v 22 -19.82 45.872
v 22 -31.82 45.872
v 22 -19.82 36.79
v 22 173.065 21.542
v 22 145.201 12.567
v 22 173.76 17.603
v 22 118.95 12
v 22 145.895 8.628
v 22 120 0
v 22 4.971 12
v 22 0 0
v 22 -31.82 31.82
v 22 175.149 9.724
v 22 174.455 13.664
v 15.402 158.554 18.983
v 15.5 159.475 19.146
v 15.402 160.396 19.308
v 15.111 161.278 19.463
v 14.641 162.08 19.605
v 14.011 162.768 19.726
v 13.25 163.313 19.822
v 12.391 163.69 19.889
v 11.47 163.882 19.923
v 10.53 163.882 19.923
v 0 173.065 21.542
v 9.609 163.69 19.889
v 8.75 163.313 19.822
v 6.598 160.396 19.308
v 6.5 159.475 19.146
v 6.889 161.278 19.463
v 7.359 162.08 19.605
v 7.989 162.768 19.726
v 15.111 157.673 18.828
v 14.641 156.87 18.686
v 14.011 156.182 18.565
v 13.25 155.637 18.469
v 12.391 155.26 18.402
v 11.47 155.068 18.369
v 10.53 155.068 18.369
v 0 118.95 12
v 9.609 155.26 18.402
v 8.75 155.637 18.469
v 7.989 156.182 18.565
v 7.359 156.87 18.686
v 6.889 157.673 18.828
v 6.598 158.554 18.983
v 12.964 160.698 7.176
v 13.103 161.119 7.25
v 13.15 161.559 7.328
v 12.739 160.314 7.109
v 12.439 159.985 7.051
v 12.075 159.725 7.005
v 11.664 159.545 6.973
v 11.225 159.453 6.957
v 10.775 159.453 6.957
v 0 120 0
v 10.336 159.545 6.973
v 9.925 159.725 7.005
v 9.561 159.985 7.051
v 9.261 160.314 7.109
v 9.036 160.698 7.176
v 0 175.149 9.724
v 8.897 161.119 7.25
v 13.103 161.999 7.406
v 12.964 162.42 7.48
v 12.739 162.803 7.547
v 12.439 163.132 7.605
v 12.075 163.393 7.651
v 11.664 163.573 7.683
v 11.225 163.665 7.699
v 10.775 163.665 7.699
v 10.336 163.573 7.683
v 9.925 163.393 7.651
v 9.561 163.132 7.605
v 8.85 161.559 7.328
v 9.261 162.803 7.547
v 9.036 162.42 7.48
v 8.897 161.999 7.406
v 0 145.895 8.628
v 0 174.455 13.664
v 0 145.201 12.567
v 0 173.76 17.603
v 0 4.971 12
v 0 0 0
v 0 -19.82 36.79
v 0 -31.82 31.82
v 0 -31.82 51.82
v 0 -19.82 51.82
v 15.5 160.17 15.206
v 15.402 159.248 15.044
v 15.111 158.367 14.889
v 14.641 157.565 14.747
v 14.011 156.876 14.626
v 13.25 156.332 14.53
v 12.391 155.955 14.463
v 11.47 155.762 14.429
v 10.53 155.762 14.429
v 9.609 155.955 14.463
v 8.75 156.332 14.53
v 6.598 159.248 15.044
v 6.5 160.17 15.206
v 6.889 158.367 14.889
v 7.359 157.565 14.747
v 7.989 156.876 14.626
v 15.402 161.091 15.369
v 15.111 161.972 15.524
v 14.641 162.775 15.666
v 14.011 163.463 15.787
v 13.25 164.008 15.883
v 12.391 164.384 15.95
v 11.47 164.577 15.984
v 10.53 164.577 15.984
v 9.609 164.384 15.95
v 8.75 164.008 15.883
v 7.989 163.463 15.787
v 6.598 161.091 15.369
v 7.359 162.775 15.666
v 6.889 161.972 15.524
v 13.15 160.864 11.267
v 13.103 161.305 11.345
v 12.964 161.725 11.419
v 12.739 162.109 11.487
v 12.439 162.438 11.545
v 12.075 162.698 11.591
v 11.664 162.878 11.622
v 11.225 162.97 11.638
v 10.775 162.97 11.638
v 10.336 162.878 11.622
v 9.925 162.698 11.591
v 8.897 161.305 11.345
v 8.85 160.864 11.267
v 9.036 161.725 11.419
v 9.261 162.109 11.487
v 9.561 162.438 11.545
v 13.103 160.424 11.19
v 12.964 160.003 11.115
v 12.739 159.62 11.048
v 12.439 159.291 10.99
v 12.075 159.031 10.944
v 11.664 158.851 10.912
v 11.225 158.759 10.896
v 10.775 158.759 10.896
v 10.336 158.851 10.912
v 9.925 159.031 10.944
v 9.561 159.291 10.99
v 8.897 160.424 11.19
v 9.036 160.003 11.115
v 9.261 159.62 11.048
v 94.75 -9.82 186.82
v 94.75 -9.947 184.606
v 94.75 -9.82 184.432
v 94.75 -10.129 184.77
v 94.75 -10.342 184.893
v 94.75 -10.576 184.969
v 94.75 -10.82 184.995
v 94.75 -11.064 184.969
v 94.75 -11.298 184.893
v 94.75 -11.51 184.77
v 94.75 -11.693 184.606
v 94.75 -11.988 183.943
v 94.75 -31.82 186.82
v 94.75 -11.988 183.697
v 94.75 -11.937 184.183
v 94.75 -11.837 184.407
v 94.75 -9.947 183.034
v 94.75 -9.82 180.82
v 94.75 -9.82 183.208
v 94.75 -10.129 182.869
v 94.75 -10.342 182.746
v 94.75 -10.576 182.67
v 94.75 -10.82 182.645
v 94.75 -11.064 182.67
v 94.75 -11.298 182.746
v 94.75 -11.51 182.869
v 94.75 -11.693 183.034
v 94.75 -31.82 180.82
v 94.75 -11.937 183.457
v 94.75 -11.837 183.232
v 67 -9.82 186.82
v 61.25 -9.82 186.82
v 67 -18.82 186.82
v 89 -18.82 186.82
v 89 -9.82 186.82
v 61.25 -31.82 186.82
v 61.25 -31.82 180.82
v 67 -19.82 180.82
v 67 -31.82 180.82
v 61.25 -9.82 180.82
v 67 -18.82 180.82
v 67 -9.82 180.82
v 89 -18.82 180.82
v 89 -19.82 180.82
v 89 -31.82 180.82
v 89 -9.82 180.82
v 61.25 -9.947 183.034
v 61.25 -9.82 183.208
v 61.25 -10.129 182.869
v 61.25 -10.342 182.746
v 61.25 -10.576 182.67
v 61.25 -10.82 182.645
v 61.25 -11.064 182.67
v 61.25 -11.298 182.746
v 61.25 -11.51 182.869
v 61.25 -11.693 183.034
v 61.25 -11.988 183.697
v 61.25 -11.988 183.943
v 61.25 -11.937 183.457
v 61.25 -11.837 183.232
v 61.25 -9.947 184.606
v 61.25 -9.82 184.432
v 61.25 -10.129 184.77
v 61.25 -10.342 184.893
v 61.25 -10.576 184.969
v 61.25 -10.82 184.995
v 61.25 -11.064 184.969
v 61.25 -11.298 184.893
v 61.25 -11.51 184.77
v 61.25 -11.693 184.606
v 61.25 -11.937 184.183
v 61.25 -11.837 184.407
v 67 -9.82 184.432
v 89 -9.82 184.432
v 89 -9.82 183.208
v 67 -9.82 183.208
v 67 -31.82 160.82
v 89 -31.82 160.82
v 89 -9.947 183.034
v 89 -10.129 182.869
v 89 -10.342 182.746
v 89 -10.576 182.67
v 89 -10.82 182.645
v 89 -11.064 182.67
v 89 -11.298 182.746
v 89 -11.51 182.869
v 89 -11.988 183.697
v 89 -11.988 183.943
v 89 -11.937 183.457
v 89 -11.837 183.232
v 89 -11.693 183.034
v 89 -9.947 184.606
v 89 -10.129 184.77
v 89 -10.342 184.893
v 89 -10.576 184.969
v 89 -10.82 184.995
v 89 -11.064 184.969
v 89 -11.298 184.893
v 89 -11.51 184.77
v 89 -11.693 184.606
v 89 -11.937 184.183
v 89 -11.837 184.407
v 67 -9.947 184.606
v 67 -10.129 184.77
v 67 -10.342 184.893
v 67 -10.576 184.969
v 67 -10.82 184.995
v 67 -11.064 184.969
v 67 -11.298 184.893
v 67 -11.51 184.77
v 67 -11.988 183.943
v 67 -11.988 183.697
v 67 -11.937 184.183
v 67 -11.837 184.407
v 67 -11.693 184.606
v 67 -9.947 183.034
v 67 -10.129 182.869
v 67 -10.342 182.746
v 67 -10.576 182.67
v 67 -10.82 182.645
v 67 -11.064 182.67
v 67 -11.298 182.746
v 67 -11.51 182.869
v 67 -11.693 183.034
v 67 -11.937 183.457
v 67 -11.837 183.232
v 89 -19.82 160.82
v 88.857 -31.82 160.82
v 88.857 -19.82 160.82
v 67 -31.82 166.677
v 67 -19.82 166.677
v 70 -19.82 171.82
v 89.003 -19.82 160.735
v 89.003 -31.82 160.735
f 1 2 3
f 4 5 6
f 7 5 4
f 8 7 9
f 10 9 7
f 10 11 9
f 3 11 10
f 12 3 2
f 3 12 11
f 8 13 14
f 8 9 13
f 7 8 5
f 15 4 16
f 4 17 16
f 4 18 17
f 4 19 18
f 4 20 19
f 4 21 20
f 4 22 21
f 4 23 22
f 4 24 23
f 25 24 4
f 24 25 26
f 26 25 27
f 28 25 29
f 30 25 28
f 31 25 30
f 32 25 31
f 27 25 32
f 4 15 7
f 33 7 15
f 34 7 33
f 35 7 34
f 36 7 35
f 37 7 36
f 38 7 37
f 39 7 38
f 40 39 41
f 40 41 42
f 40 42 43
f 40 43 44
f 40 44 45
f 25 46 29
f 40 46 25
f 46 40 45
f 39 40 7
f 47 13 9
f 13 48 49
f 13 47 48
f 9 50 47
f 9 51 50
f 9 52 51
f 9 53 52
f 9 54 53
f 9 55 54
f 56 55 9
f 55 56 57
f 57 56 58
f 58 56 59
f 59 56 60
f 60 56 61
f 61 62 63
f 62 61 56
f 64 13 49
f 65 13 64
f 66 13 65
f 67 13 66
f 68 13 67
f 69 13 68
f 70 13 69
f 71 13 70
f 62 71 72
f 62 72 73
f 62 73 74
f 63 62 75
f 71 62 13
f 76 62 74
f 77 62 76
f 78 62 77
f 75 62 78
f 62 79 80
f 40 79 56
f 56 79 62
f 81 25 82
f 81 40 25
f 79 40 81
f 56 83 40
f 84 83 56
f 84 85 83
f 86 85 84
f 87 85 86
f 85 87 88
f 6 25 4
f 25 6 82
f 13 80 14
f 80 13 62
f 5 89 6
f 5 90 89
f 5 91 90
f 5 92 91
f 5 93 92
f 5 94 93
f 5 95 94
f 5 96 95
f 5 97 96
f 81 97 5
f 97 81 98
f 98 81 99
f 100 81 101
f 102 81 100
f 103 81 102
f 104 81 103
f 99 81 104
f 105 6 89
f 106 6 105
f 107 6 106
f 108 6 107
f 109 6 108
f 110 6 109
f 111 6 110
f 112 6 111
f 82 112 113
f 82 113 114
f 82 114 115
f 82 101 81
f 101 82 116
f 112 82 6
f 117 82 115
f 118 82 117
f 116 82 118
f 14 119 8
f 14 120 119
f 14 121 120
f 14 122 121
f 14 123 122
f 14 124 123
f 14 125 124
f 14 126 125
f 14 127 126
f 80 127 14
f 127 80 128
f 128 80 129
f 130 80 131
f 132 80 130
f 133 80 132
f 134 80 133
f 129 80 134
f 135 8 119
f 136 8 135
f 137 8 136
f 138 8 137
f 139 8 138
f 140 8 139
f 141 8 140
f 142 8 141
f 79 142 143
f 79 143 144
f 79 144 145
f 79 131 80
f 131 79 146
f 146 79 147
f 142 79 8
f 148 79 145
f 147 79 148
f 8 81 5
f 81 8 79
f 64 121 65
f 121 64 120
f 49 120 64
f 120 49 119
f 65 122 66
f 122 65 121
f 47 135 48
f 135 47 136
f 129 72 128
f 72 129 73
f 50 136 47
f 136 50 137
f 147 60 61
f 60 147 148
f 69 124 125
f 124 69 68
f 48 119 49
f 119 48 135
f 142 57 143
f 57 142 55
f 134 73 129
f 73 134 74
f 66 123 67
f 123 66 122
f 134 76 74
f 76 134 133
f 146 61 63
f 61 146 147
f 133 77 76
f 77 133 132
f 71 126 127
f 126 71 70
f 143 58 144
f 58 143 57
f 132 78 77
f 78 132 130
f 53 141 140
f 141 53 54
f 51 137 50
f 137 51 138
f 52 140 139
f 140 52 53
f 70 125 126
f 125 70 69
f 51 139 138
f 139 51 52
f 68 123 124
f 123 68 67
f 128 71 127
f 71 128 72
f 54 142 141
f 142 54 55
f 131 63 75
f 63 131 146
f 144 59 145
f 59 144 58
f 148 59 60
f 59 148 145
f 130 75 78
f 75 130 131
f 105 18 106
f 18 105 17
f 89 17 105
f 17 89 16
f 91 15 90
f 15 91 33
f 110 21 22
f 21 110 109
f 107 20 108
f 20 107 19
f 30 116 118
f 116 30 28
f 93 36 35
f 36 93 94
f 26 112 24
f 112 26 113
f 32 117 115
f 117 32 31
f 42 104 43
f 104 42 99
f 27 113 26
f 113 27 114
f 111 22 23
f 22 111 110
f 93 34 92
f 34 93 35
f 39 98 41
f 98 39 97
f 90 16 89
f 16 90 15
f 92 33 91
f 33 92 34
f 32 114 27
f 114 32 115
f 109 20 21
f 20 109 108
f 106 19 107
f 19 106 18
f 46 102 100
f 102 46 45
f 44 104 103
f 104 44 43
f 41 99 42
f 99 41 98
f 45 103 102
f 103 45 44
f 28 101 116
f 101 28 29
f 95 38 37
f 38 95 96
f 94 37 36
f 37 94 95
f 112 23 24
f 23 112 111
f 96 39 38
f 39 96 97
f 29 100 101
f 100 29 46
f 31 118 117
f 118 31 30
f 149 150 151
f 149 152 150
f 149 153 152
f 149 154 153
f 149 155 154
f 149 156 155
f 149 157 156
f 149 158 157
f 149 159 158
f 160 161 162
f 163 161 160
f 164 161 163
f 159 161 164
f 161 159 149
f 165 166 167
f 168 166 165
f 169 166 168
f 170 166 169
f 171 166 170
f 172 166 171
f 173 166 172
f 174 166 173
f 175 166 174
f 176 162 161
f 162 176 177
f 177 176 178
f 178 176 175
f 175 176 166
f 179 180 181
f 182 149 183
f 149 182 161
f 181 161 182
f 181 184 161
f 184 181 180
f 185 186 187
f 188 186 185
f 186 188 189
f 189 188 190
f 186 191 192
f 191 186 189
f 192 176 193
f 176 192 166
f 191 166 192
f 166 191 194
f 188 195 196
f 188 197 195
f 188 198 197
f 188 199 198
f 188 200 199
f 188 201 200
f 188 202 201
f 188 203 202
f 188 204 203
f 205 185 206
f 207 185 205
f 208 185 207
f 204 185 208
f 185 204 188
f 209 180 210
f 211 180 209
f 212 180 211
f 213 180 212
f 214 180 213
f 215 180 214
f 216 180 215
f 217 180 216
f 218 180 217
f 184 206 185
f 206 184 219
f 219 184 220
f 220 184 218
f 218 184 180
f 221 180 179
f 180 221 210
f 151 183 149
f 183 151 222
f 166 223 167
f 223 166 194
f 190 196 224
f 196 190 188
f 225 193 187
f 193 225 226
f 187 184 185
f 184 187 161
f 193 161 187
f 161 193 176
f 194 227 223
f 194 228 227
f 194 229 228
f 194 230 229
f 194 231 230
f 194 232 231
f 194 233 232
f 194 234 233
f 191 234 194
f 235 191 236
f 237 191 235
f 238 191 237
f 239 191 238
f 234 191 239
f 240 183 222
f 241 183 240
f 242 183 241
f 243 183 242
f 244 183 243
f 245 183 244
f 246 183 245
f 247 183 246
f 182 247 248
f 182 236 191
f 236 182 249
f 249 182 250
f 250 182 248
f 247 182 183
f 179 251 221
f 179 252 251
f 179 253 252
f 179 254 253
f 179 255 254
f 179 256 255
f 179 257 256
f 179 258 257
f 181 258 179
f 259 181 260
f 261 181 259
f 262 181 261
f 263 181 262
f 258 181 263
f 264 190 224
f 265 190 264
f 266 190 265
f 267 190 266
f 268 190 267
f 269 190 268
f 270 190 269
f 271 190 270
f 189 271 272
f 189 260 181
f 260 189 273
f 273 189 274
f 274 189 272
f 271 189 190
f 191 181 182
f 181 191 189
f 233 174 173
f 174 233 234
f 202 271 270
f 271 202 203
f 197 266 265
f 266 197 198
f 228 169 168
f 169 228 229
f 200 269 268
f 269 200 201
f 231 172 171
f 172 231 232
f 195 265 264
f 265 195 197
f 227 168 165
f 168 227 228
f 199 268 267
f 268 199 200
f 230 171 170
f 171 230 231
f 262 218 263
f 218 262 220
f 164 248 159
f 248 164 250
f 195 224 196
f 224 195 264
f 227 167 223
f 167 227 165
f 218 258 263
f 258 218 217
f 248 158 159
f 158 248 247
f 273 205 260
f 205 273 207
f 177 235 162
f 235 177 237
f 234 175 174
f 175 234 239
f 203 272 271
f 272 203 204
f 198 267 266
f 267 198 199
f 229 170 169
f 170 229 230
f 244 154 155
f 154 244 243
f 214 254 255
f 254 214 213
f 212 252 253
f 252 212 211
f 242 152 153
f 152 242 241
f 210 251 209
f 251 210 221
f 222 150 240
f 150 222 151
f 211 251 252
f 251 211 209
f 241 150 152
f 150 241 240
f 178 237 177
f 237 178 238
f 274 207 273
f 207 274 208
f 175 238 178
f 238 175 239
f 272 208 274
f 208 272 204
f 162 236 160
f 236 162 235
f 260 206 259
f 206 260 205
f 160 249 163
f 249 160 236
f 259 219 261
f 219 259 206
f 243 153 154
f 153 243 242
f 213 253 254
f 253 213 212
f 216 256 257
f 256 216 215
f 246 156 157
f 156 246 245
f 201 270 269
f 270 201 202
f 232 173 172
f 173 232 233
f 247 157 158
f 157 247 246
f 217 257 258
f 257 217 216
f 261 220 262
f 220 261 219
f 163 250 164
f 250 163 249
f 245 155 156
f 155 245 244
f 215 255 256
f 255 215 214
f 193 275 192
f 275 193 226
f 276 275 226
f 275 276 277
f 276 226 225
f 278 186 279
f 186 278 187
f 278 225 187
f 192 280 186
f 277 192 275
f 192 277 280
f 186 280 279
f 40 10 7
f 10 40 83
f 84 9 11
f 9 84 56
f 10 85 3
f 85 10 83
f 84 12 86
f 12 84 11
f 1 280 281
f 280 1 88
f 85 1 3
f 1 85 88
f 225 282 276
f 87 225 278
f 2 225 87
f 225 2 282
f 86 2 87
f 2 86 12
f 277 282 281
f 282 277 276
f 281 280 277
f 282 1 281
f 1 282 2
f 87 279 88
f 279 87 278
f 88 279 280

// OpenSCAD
// We want our holes to be nice and smooth
$fn = 30;

// Which mount should we build
mountc615=true;
mounttripod=false;

// Define some sizes  --- Note:  changing these parameters is probably not safe
at=12;   // Arm thickness
aw=22;   // Arm width
alen=120; // Lenth of arm under build bed - before mount segment
clen=45; // Length of 45 degree segment

// Camera mount offset towards bed center (default is ~60 degree angle)
offheight=120;
offcenter=70;

// Horizontal/vertical offset for the corner segment
// a^2 + b^2 = clen^2 - a==b
choff = sqrt((clen*clen)/2);


union() {
    // First section connects to the corner of the build support platform
    translate([0,alen,0]) rotate([10,0,0]) difference() {
        // We're doing some math with these - make them easy to change
        ml=56;
        mlopen=29;
        lhsize=4.3;
        uhsize=9;
        hdist=13.8;
        cube([aw,ml,at]);
        translate([0,ml-mlopen,at/3])
            cube([aw,mlopen,at/3]);
        translate([aw/2,ml-hdist,0])
            cylinder(h=at, d=lhsize);
        translate([aw/2,ml-hdist,at/3])
            cylinder(h=2*at/3, d=uhsize);
    }
    // Main extension to get from the corner of the bed to the front
    cube  ([aw,alen,at]);
    // Corner section before vertical
    translate  ([aw,0,0])
        rotate ([45,0,180])
        cube   ([aw,clen,at]);
    // Vertical standoff - Cheat to smooth
    translate  ([0,-choff, choff])
        cube   ([aw,at,20]);
    // Vertical support
    translate ([0,-choff, choff+20])
        ctrbar();
    // Mount -- This positioning doesn't quite work for anything other than default centering angle
    translate  ([offcenter-3,-choff,choff+offheight+9])
        mount();
}

module ctrbar() {
    rot=atan(offheight/offcenter);
    len=sqrt(offheight*offheight + offcenter*offcenter);
    rotate([0,90-rot,0]) cube([aw,at,len]);
}

module mount() {
    base=20;
    // C615 Mount
    if (mountc615) {
        union() {
            cube([aw, at, base]);
            translate([-(33.5-aw)/2,0,base]) difference() {
                cube([33.5,at+10,6]);
                translate([(33.5-22)/2,at+1,0]) cube([22,9,7]);
                #translate([0,at+9,3]) rotate([0,90,0]) cylinder(h=33.5, d=2.35);
            }
        }
    }
    // Tripod (1/4"x20) mount
    if (mounttripod) {
    }
}
